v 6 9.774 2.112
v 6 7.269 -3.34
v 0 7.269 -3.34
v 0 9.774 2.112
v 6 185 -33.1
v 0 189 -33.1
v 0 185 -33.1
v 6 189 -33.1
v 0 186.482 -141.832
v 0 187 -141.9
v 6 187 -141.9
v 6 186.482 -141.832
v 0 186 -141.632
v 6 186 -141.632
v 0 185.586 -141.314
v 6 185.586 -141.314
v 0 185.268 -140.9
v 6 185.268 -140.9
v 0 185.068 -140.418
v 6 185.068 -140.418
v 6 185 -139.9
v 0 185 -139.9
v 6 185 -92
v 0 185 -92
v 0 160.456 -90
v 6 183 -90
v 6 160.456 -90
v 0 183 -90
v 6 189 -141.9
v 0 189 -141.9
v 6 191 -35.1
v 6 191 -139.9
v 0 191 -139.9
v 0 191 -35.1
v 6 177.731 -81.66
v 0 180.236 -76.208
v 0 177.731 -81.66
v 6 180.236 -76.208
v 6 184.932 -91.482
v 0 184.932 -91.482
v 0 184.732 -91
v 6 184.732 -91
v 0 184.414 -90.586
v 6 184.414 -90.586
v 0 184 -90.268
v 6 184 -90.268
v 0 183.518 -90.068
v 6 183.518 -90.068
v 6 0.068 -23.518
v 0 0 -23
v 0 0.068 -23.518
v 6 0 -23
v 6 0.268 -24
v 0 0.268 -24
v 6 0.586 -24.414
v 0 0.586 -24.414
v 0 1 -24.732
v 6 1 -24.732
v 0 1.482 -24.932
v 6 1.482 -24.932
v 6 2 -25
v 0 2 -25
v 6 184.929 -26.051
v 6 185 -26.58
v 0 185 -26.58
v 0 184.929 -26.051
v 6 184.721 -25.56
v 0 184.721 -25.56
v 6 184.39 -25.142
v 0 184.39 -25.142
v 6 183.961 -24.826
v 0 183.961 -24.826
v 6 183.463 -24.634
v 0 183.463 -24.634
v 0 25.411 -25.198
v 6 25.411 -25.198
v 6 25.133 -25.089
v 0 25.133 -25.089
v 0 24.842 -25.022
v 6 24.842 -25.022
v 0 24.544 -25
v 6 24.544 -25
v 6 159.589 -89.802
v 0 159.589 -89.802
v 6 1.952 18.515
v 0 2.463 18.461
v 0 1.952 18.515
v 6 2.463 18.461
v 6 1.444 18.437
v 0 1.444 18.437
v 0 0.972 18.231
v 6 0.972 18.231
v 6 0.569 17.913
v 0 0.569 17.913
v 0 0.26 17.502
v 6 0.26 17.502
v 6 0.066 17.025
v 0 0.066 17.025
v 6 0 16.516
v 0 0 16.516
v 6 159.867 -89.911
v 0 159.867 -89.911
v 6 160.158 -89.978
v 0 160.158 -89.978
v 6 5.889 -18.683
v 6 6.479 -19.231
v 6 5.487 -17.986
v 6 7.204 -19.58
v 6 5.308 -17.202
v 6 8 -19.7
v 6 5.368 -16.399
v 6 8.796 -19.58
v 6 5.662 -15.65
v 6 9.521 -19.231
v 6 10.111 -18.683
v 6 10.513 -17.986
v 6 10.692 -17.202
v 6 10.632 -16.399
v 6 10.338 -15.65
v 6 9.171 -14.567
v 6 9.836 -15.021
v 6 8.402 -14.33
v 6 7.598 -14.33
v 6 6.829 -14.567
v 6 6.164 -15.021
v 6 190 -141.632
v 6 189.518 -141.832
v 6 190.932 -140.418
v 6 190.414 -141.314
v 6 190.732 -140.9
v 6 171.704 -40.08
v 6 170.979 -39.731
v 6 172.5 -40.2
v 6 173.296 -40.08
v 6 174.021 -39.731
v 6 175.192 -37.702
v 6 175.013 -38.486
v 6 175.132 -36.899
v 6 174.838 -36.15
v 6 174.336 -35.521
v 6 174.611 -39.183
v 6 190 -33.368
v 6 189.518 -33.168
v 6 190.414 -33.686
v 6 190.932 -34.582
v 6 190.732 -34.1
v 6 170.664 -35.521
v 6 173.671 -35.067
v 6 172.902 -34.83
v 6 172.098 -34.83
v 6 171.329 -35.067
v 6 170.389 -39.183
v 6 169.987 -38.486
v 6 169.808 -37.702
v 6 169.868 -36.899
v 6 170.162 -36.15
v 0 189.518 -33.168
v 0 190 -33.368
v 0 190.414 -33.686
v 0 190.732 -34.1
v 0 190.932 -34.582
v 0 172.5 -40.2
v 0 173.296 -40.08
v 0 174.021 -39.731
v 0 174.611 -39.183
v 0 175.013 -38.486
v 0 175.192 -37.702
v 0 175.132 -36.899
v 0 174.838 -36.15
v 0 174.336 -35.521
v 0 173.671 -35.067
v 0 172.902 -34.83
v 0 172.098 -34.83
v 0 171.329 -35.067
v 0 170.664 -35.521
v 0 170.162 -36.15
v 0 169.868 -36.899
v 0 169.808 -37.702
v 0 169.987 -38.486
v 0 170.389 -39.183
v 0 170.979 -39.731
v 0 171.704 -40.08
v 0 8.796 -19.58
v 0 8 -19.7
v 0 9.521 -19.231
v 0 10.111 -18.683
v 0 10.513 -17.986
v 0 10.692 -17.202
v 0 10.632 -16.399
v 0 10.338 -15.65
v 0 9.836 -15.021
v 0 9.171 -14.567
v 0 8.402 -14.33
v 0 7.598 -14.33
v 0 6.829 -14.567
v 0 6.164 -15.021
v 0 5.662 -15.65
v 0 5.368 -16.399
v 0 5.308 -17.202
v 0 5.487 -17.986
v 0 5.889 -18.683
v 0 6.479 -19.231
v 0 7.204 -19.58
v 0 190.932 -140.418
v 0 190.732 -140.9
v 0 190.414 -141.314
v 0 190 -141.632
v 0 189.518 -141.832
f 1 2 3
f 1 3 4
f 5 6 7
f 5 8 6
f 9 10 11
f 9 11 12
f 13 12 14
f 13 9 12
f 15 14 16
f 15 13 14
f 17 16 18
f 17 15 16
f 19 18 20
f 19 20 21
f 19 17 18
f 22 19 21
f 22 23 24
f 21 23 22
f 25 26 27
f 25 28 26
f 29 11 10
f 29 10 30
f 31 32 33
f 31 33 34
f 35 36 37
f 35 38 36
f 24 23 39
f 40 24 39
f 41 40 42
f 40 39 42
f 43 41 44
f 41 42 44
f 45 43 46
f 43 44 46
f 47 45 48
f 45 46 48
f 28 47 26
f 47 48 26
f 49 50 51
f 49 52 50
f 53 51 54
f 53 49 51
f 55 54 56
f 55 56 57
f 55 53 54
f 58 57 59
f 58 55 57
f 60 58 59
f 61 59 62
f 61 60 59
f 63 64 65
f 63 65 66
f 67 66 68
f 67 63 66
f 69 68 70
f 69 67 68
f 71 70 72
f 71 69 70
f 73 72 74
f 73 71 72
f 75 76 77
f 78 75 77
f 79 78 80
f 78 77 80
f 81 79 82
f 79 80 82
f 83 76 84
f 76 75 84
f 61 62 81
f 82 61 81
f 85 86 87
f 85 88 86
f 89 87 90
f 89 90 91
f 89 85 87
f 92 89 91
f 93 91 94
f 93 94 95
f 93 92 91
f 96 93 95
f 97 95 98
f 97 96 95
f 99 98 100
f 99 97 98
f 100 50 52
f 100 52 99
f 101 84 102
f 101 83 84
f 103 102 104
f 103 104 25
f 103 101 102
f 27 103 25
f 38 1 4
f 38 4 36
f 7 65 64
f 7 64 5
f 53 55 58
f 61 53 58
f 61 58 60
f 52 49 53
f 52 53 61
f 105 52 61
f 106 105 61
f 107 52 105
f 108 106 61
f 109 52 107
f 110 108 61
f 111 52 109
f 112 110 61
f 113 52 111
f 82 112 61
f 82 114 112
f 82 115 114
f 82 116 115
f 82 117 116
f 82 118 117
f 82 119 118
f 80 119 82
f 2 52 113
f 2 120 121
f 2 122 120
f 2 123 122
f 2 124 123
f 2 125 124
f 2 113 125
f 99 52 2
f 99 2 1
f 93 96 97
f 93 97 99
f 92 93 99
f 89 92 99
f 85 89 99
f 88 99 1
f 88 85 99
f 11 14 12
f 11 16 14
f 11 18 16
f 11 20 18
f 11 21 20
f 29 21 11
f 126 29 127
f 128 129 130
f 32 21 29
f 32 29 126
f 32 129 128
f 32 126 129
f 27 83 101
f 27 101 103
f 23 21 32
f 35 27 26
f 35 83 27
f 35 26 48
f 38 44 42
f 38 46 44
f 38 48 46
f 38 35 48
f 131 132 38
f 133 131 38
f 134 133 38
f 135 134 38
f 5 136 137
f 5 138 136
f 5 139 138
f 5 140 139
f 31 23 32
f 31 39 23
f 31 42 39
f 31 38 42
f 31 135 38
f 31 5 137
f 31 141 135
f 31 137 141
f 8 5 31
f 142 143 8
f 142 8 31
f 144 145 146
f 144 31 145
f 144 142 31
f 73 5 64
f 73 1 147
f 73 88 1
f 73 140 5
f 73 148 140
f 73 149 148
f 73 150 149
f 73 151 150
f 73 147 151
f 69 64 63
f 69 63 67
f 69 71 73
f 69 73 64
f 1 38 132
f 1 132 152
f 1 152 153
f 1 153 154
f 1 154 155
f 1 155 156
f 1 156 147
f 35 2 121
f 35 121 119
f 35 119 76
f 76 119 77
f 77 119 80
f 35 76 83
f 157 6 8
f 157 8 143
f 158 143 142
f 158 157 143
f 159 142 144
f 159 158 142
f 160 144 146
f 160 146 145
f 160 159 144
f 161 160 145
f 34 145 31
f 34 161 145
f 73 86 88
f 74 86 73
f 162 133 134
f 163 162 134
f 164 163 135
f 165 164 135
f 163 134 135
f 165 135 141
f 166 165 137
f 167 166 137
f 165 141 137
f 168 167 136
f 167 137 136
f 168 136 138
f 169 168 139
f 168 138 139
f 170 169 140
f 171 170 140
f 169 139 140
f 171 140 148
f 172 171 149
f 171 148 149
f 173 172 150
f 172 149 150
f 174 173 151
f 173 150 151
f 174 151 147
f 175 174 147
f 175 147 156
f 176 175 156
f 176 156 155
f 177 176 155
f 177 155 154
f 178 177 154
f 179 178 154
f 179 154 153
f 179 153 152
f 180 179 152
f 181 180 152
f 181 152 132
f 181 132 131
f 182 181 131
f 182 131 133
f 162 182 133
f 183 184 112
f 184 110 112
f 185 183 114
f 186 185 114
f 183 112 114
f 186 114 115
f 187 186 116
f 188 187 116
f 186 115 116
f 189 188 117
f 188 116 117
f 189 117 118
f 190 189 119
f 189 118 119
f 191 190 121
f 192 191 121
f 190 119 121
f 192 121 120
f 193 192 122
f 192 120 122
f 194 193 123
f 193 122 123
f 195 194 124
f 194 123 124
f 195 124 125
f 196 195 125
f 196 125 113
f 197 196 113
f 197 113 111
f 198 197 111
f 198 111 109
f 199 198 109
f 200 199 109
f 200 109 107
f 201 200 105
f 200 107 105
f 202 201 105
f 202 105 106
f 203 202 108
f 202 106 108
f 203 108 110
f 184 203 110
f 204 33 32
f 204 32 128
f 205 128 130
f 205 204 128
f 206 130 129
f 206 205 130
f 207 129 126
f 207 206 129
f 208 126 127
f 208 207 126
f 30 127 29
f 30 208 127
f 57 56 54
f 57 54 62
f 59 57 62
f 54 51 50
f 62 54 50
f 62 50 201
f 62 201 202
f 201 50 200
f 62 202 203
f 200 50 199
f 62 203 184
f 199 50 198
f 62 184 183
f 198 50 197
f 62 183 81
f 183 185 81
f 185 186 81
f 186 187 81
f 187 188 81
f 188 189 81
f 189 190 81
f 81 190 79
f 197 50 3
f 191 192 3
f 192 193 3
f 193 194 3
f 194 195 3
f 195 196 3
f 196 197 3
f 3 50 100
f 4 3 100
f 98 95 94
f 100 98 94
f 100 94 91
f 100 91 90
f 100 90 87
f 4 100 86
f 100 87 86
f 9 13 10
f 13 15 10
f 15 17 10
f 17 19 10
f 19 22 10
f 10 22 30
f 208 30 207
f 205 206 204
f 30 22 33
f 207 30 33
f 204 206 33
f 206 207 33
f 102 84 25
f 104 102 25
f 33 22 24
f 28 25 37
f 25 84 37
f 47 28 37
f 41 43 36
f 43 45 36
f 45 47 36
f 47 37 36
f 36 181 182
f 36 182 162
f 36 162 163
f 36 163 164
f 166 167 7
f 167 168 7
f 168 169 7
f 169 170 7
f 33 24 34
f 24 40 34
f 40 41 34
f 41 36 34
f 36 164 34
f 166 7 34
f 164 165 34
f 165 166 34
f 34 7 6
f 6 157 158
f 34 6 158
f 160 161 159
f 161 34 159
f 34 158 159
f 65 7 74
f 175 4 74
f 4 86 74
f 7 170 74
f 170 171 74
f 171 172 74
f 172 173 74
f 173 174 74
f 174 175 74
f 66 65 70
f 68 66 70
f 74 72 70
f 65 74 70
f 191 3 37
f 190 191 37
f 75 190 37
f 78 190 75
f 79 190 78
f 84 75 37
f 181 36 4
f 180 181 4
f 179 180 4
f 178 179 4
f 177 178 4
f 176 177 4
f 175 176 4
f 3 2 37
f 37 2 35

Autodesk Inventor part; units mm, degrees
ref_plane "YZ Plane" through (0, 0, 0) normal (1, 0, 0) x (0, 1, 0)
ref_plane "XZ Plane" through (0, 0, 0) normal (0, 1, 0) x (-1, 0, 0)
ref_plane "XY Plane" through (0, 0, 0) normal (0, 0, 1) x (1, 0, 0)
sketch "Sketch1" plane through (0, 0, 0) normal (1, 0, 0) x (0, 1, 0)
  line L0 (0, 0) -> (0, 25) construction
  line L1 (185, -25) -> (185, -90)
  line L2 (185, -25) -> (-25, 25) construction
  line L3 (0, 0) -> (0, 19.0476)
  line L4 (0, 19.0476) -> (185, -25)
  line L5 (0, -25) -> (0, 0)
  line L6 (185, -90) -> (160, -90)
  line L7 (0, -25) -> (25, -25)
  line L8 (25, -25) -> (160, -90)
  dimension "d0" = 25
  dimension "d1" = 65
  dimension "d2" = 185
  dimension "d10" = 25
  dimension "d11" = 25
  dimension "d17" = 25
  dimension "d20" = 25
extrude "Extrusion1" add sketch "Sketch1" along normal blind 6
sketch "Sketch3" plane through (6, 0, 0) normal (1, 0, 0) x (0, 0, -1)
  line L0 (90, 185) -> (25, 185) projected
  line L1 (33.1, 185) -> (141.9, 185)
  line L2 (141.9, 185) -> (141.9, 191)
  line L3 (141.9, 191) -> (33.1, 191)
  line L4 (33.1, 191) -> (33.1, 185)
  dimension "d12" = 8.1
  dimension "d14" = 6
  dimension "d21" = 108.8
extrude "Extrusion3" add sketch "Sketch3" against normal blind 6
sketch "Sketch4" plane through (6, 0, 0) normal (1, 0, 0) x (0, 0, -1)
  line L0 (0, 0) -> (85, 185) construction
  line L1 (3.34, 7.2694) -> (-2.1121, 9.7744)
  line L2 (-2.1121, 9.7744) -> (76.2079, 180.2356)
  line L3 (76.2079, 180.2356) -> (81.66, 177.7306)
  line L4 (3.34, 7.2694) -> (81.66, 177.7306)
  dimension "d23" = 185
  dimension "d24" = 85
  dimension "d28" = 8
  dimension "d29" = 8
  dimension "d32" = 6
extrude "Extrusion4" cut sketch "Sketch4" against normal through all
sketch "Sketch5" plane through (6, 0, 0) normal (1, 0, 0) x (0, 0, -1)
  line L0 (-19.0476, 0) -> (25, 0) projected
  line L1 (25, 0) -> (25, 25) projected
  line L2 (33.1, 185) -> (25, 185) projected
  circle A0 centre (37.5, 172.5) radius 2.7
  circle A1 centre (17, 8) radius 2.7
  point P0 (0, 0)
  dimension "d34" = 12.5
  dimension "d35" = 12.5
  dimension "d36" = 5.4
  dimension "d37" = 5.4
  dimension "d38" = 8
  dimension "d39" = 8
extrude "Extrusion5" cut sketch "Sketch5" against normal through all
fillet "Fillet1" radius 2 9 edges at (3, 185, -25) (3, 191, -33.1) (3, 191, -141.9) (3, 185, -141.9) (3, 185, -90) (3, 160, -90) (3, 25, -25) (3, 0, -25) (3, 0, 19.0476)
properties part number "ControlRightPanel"
